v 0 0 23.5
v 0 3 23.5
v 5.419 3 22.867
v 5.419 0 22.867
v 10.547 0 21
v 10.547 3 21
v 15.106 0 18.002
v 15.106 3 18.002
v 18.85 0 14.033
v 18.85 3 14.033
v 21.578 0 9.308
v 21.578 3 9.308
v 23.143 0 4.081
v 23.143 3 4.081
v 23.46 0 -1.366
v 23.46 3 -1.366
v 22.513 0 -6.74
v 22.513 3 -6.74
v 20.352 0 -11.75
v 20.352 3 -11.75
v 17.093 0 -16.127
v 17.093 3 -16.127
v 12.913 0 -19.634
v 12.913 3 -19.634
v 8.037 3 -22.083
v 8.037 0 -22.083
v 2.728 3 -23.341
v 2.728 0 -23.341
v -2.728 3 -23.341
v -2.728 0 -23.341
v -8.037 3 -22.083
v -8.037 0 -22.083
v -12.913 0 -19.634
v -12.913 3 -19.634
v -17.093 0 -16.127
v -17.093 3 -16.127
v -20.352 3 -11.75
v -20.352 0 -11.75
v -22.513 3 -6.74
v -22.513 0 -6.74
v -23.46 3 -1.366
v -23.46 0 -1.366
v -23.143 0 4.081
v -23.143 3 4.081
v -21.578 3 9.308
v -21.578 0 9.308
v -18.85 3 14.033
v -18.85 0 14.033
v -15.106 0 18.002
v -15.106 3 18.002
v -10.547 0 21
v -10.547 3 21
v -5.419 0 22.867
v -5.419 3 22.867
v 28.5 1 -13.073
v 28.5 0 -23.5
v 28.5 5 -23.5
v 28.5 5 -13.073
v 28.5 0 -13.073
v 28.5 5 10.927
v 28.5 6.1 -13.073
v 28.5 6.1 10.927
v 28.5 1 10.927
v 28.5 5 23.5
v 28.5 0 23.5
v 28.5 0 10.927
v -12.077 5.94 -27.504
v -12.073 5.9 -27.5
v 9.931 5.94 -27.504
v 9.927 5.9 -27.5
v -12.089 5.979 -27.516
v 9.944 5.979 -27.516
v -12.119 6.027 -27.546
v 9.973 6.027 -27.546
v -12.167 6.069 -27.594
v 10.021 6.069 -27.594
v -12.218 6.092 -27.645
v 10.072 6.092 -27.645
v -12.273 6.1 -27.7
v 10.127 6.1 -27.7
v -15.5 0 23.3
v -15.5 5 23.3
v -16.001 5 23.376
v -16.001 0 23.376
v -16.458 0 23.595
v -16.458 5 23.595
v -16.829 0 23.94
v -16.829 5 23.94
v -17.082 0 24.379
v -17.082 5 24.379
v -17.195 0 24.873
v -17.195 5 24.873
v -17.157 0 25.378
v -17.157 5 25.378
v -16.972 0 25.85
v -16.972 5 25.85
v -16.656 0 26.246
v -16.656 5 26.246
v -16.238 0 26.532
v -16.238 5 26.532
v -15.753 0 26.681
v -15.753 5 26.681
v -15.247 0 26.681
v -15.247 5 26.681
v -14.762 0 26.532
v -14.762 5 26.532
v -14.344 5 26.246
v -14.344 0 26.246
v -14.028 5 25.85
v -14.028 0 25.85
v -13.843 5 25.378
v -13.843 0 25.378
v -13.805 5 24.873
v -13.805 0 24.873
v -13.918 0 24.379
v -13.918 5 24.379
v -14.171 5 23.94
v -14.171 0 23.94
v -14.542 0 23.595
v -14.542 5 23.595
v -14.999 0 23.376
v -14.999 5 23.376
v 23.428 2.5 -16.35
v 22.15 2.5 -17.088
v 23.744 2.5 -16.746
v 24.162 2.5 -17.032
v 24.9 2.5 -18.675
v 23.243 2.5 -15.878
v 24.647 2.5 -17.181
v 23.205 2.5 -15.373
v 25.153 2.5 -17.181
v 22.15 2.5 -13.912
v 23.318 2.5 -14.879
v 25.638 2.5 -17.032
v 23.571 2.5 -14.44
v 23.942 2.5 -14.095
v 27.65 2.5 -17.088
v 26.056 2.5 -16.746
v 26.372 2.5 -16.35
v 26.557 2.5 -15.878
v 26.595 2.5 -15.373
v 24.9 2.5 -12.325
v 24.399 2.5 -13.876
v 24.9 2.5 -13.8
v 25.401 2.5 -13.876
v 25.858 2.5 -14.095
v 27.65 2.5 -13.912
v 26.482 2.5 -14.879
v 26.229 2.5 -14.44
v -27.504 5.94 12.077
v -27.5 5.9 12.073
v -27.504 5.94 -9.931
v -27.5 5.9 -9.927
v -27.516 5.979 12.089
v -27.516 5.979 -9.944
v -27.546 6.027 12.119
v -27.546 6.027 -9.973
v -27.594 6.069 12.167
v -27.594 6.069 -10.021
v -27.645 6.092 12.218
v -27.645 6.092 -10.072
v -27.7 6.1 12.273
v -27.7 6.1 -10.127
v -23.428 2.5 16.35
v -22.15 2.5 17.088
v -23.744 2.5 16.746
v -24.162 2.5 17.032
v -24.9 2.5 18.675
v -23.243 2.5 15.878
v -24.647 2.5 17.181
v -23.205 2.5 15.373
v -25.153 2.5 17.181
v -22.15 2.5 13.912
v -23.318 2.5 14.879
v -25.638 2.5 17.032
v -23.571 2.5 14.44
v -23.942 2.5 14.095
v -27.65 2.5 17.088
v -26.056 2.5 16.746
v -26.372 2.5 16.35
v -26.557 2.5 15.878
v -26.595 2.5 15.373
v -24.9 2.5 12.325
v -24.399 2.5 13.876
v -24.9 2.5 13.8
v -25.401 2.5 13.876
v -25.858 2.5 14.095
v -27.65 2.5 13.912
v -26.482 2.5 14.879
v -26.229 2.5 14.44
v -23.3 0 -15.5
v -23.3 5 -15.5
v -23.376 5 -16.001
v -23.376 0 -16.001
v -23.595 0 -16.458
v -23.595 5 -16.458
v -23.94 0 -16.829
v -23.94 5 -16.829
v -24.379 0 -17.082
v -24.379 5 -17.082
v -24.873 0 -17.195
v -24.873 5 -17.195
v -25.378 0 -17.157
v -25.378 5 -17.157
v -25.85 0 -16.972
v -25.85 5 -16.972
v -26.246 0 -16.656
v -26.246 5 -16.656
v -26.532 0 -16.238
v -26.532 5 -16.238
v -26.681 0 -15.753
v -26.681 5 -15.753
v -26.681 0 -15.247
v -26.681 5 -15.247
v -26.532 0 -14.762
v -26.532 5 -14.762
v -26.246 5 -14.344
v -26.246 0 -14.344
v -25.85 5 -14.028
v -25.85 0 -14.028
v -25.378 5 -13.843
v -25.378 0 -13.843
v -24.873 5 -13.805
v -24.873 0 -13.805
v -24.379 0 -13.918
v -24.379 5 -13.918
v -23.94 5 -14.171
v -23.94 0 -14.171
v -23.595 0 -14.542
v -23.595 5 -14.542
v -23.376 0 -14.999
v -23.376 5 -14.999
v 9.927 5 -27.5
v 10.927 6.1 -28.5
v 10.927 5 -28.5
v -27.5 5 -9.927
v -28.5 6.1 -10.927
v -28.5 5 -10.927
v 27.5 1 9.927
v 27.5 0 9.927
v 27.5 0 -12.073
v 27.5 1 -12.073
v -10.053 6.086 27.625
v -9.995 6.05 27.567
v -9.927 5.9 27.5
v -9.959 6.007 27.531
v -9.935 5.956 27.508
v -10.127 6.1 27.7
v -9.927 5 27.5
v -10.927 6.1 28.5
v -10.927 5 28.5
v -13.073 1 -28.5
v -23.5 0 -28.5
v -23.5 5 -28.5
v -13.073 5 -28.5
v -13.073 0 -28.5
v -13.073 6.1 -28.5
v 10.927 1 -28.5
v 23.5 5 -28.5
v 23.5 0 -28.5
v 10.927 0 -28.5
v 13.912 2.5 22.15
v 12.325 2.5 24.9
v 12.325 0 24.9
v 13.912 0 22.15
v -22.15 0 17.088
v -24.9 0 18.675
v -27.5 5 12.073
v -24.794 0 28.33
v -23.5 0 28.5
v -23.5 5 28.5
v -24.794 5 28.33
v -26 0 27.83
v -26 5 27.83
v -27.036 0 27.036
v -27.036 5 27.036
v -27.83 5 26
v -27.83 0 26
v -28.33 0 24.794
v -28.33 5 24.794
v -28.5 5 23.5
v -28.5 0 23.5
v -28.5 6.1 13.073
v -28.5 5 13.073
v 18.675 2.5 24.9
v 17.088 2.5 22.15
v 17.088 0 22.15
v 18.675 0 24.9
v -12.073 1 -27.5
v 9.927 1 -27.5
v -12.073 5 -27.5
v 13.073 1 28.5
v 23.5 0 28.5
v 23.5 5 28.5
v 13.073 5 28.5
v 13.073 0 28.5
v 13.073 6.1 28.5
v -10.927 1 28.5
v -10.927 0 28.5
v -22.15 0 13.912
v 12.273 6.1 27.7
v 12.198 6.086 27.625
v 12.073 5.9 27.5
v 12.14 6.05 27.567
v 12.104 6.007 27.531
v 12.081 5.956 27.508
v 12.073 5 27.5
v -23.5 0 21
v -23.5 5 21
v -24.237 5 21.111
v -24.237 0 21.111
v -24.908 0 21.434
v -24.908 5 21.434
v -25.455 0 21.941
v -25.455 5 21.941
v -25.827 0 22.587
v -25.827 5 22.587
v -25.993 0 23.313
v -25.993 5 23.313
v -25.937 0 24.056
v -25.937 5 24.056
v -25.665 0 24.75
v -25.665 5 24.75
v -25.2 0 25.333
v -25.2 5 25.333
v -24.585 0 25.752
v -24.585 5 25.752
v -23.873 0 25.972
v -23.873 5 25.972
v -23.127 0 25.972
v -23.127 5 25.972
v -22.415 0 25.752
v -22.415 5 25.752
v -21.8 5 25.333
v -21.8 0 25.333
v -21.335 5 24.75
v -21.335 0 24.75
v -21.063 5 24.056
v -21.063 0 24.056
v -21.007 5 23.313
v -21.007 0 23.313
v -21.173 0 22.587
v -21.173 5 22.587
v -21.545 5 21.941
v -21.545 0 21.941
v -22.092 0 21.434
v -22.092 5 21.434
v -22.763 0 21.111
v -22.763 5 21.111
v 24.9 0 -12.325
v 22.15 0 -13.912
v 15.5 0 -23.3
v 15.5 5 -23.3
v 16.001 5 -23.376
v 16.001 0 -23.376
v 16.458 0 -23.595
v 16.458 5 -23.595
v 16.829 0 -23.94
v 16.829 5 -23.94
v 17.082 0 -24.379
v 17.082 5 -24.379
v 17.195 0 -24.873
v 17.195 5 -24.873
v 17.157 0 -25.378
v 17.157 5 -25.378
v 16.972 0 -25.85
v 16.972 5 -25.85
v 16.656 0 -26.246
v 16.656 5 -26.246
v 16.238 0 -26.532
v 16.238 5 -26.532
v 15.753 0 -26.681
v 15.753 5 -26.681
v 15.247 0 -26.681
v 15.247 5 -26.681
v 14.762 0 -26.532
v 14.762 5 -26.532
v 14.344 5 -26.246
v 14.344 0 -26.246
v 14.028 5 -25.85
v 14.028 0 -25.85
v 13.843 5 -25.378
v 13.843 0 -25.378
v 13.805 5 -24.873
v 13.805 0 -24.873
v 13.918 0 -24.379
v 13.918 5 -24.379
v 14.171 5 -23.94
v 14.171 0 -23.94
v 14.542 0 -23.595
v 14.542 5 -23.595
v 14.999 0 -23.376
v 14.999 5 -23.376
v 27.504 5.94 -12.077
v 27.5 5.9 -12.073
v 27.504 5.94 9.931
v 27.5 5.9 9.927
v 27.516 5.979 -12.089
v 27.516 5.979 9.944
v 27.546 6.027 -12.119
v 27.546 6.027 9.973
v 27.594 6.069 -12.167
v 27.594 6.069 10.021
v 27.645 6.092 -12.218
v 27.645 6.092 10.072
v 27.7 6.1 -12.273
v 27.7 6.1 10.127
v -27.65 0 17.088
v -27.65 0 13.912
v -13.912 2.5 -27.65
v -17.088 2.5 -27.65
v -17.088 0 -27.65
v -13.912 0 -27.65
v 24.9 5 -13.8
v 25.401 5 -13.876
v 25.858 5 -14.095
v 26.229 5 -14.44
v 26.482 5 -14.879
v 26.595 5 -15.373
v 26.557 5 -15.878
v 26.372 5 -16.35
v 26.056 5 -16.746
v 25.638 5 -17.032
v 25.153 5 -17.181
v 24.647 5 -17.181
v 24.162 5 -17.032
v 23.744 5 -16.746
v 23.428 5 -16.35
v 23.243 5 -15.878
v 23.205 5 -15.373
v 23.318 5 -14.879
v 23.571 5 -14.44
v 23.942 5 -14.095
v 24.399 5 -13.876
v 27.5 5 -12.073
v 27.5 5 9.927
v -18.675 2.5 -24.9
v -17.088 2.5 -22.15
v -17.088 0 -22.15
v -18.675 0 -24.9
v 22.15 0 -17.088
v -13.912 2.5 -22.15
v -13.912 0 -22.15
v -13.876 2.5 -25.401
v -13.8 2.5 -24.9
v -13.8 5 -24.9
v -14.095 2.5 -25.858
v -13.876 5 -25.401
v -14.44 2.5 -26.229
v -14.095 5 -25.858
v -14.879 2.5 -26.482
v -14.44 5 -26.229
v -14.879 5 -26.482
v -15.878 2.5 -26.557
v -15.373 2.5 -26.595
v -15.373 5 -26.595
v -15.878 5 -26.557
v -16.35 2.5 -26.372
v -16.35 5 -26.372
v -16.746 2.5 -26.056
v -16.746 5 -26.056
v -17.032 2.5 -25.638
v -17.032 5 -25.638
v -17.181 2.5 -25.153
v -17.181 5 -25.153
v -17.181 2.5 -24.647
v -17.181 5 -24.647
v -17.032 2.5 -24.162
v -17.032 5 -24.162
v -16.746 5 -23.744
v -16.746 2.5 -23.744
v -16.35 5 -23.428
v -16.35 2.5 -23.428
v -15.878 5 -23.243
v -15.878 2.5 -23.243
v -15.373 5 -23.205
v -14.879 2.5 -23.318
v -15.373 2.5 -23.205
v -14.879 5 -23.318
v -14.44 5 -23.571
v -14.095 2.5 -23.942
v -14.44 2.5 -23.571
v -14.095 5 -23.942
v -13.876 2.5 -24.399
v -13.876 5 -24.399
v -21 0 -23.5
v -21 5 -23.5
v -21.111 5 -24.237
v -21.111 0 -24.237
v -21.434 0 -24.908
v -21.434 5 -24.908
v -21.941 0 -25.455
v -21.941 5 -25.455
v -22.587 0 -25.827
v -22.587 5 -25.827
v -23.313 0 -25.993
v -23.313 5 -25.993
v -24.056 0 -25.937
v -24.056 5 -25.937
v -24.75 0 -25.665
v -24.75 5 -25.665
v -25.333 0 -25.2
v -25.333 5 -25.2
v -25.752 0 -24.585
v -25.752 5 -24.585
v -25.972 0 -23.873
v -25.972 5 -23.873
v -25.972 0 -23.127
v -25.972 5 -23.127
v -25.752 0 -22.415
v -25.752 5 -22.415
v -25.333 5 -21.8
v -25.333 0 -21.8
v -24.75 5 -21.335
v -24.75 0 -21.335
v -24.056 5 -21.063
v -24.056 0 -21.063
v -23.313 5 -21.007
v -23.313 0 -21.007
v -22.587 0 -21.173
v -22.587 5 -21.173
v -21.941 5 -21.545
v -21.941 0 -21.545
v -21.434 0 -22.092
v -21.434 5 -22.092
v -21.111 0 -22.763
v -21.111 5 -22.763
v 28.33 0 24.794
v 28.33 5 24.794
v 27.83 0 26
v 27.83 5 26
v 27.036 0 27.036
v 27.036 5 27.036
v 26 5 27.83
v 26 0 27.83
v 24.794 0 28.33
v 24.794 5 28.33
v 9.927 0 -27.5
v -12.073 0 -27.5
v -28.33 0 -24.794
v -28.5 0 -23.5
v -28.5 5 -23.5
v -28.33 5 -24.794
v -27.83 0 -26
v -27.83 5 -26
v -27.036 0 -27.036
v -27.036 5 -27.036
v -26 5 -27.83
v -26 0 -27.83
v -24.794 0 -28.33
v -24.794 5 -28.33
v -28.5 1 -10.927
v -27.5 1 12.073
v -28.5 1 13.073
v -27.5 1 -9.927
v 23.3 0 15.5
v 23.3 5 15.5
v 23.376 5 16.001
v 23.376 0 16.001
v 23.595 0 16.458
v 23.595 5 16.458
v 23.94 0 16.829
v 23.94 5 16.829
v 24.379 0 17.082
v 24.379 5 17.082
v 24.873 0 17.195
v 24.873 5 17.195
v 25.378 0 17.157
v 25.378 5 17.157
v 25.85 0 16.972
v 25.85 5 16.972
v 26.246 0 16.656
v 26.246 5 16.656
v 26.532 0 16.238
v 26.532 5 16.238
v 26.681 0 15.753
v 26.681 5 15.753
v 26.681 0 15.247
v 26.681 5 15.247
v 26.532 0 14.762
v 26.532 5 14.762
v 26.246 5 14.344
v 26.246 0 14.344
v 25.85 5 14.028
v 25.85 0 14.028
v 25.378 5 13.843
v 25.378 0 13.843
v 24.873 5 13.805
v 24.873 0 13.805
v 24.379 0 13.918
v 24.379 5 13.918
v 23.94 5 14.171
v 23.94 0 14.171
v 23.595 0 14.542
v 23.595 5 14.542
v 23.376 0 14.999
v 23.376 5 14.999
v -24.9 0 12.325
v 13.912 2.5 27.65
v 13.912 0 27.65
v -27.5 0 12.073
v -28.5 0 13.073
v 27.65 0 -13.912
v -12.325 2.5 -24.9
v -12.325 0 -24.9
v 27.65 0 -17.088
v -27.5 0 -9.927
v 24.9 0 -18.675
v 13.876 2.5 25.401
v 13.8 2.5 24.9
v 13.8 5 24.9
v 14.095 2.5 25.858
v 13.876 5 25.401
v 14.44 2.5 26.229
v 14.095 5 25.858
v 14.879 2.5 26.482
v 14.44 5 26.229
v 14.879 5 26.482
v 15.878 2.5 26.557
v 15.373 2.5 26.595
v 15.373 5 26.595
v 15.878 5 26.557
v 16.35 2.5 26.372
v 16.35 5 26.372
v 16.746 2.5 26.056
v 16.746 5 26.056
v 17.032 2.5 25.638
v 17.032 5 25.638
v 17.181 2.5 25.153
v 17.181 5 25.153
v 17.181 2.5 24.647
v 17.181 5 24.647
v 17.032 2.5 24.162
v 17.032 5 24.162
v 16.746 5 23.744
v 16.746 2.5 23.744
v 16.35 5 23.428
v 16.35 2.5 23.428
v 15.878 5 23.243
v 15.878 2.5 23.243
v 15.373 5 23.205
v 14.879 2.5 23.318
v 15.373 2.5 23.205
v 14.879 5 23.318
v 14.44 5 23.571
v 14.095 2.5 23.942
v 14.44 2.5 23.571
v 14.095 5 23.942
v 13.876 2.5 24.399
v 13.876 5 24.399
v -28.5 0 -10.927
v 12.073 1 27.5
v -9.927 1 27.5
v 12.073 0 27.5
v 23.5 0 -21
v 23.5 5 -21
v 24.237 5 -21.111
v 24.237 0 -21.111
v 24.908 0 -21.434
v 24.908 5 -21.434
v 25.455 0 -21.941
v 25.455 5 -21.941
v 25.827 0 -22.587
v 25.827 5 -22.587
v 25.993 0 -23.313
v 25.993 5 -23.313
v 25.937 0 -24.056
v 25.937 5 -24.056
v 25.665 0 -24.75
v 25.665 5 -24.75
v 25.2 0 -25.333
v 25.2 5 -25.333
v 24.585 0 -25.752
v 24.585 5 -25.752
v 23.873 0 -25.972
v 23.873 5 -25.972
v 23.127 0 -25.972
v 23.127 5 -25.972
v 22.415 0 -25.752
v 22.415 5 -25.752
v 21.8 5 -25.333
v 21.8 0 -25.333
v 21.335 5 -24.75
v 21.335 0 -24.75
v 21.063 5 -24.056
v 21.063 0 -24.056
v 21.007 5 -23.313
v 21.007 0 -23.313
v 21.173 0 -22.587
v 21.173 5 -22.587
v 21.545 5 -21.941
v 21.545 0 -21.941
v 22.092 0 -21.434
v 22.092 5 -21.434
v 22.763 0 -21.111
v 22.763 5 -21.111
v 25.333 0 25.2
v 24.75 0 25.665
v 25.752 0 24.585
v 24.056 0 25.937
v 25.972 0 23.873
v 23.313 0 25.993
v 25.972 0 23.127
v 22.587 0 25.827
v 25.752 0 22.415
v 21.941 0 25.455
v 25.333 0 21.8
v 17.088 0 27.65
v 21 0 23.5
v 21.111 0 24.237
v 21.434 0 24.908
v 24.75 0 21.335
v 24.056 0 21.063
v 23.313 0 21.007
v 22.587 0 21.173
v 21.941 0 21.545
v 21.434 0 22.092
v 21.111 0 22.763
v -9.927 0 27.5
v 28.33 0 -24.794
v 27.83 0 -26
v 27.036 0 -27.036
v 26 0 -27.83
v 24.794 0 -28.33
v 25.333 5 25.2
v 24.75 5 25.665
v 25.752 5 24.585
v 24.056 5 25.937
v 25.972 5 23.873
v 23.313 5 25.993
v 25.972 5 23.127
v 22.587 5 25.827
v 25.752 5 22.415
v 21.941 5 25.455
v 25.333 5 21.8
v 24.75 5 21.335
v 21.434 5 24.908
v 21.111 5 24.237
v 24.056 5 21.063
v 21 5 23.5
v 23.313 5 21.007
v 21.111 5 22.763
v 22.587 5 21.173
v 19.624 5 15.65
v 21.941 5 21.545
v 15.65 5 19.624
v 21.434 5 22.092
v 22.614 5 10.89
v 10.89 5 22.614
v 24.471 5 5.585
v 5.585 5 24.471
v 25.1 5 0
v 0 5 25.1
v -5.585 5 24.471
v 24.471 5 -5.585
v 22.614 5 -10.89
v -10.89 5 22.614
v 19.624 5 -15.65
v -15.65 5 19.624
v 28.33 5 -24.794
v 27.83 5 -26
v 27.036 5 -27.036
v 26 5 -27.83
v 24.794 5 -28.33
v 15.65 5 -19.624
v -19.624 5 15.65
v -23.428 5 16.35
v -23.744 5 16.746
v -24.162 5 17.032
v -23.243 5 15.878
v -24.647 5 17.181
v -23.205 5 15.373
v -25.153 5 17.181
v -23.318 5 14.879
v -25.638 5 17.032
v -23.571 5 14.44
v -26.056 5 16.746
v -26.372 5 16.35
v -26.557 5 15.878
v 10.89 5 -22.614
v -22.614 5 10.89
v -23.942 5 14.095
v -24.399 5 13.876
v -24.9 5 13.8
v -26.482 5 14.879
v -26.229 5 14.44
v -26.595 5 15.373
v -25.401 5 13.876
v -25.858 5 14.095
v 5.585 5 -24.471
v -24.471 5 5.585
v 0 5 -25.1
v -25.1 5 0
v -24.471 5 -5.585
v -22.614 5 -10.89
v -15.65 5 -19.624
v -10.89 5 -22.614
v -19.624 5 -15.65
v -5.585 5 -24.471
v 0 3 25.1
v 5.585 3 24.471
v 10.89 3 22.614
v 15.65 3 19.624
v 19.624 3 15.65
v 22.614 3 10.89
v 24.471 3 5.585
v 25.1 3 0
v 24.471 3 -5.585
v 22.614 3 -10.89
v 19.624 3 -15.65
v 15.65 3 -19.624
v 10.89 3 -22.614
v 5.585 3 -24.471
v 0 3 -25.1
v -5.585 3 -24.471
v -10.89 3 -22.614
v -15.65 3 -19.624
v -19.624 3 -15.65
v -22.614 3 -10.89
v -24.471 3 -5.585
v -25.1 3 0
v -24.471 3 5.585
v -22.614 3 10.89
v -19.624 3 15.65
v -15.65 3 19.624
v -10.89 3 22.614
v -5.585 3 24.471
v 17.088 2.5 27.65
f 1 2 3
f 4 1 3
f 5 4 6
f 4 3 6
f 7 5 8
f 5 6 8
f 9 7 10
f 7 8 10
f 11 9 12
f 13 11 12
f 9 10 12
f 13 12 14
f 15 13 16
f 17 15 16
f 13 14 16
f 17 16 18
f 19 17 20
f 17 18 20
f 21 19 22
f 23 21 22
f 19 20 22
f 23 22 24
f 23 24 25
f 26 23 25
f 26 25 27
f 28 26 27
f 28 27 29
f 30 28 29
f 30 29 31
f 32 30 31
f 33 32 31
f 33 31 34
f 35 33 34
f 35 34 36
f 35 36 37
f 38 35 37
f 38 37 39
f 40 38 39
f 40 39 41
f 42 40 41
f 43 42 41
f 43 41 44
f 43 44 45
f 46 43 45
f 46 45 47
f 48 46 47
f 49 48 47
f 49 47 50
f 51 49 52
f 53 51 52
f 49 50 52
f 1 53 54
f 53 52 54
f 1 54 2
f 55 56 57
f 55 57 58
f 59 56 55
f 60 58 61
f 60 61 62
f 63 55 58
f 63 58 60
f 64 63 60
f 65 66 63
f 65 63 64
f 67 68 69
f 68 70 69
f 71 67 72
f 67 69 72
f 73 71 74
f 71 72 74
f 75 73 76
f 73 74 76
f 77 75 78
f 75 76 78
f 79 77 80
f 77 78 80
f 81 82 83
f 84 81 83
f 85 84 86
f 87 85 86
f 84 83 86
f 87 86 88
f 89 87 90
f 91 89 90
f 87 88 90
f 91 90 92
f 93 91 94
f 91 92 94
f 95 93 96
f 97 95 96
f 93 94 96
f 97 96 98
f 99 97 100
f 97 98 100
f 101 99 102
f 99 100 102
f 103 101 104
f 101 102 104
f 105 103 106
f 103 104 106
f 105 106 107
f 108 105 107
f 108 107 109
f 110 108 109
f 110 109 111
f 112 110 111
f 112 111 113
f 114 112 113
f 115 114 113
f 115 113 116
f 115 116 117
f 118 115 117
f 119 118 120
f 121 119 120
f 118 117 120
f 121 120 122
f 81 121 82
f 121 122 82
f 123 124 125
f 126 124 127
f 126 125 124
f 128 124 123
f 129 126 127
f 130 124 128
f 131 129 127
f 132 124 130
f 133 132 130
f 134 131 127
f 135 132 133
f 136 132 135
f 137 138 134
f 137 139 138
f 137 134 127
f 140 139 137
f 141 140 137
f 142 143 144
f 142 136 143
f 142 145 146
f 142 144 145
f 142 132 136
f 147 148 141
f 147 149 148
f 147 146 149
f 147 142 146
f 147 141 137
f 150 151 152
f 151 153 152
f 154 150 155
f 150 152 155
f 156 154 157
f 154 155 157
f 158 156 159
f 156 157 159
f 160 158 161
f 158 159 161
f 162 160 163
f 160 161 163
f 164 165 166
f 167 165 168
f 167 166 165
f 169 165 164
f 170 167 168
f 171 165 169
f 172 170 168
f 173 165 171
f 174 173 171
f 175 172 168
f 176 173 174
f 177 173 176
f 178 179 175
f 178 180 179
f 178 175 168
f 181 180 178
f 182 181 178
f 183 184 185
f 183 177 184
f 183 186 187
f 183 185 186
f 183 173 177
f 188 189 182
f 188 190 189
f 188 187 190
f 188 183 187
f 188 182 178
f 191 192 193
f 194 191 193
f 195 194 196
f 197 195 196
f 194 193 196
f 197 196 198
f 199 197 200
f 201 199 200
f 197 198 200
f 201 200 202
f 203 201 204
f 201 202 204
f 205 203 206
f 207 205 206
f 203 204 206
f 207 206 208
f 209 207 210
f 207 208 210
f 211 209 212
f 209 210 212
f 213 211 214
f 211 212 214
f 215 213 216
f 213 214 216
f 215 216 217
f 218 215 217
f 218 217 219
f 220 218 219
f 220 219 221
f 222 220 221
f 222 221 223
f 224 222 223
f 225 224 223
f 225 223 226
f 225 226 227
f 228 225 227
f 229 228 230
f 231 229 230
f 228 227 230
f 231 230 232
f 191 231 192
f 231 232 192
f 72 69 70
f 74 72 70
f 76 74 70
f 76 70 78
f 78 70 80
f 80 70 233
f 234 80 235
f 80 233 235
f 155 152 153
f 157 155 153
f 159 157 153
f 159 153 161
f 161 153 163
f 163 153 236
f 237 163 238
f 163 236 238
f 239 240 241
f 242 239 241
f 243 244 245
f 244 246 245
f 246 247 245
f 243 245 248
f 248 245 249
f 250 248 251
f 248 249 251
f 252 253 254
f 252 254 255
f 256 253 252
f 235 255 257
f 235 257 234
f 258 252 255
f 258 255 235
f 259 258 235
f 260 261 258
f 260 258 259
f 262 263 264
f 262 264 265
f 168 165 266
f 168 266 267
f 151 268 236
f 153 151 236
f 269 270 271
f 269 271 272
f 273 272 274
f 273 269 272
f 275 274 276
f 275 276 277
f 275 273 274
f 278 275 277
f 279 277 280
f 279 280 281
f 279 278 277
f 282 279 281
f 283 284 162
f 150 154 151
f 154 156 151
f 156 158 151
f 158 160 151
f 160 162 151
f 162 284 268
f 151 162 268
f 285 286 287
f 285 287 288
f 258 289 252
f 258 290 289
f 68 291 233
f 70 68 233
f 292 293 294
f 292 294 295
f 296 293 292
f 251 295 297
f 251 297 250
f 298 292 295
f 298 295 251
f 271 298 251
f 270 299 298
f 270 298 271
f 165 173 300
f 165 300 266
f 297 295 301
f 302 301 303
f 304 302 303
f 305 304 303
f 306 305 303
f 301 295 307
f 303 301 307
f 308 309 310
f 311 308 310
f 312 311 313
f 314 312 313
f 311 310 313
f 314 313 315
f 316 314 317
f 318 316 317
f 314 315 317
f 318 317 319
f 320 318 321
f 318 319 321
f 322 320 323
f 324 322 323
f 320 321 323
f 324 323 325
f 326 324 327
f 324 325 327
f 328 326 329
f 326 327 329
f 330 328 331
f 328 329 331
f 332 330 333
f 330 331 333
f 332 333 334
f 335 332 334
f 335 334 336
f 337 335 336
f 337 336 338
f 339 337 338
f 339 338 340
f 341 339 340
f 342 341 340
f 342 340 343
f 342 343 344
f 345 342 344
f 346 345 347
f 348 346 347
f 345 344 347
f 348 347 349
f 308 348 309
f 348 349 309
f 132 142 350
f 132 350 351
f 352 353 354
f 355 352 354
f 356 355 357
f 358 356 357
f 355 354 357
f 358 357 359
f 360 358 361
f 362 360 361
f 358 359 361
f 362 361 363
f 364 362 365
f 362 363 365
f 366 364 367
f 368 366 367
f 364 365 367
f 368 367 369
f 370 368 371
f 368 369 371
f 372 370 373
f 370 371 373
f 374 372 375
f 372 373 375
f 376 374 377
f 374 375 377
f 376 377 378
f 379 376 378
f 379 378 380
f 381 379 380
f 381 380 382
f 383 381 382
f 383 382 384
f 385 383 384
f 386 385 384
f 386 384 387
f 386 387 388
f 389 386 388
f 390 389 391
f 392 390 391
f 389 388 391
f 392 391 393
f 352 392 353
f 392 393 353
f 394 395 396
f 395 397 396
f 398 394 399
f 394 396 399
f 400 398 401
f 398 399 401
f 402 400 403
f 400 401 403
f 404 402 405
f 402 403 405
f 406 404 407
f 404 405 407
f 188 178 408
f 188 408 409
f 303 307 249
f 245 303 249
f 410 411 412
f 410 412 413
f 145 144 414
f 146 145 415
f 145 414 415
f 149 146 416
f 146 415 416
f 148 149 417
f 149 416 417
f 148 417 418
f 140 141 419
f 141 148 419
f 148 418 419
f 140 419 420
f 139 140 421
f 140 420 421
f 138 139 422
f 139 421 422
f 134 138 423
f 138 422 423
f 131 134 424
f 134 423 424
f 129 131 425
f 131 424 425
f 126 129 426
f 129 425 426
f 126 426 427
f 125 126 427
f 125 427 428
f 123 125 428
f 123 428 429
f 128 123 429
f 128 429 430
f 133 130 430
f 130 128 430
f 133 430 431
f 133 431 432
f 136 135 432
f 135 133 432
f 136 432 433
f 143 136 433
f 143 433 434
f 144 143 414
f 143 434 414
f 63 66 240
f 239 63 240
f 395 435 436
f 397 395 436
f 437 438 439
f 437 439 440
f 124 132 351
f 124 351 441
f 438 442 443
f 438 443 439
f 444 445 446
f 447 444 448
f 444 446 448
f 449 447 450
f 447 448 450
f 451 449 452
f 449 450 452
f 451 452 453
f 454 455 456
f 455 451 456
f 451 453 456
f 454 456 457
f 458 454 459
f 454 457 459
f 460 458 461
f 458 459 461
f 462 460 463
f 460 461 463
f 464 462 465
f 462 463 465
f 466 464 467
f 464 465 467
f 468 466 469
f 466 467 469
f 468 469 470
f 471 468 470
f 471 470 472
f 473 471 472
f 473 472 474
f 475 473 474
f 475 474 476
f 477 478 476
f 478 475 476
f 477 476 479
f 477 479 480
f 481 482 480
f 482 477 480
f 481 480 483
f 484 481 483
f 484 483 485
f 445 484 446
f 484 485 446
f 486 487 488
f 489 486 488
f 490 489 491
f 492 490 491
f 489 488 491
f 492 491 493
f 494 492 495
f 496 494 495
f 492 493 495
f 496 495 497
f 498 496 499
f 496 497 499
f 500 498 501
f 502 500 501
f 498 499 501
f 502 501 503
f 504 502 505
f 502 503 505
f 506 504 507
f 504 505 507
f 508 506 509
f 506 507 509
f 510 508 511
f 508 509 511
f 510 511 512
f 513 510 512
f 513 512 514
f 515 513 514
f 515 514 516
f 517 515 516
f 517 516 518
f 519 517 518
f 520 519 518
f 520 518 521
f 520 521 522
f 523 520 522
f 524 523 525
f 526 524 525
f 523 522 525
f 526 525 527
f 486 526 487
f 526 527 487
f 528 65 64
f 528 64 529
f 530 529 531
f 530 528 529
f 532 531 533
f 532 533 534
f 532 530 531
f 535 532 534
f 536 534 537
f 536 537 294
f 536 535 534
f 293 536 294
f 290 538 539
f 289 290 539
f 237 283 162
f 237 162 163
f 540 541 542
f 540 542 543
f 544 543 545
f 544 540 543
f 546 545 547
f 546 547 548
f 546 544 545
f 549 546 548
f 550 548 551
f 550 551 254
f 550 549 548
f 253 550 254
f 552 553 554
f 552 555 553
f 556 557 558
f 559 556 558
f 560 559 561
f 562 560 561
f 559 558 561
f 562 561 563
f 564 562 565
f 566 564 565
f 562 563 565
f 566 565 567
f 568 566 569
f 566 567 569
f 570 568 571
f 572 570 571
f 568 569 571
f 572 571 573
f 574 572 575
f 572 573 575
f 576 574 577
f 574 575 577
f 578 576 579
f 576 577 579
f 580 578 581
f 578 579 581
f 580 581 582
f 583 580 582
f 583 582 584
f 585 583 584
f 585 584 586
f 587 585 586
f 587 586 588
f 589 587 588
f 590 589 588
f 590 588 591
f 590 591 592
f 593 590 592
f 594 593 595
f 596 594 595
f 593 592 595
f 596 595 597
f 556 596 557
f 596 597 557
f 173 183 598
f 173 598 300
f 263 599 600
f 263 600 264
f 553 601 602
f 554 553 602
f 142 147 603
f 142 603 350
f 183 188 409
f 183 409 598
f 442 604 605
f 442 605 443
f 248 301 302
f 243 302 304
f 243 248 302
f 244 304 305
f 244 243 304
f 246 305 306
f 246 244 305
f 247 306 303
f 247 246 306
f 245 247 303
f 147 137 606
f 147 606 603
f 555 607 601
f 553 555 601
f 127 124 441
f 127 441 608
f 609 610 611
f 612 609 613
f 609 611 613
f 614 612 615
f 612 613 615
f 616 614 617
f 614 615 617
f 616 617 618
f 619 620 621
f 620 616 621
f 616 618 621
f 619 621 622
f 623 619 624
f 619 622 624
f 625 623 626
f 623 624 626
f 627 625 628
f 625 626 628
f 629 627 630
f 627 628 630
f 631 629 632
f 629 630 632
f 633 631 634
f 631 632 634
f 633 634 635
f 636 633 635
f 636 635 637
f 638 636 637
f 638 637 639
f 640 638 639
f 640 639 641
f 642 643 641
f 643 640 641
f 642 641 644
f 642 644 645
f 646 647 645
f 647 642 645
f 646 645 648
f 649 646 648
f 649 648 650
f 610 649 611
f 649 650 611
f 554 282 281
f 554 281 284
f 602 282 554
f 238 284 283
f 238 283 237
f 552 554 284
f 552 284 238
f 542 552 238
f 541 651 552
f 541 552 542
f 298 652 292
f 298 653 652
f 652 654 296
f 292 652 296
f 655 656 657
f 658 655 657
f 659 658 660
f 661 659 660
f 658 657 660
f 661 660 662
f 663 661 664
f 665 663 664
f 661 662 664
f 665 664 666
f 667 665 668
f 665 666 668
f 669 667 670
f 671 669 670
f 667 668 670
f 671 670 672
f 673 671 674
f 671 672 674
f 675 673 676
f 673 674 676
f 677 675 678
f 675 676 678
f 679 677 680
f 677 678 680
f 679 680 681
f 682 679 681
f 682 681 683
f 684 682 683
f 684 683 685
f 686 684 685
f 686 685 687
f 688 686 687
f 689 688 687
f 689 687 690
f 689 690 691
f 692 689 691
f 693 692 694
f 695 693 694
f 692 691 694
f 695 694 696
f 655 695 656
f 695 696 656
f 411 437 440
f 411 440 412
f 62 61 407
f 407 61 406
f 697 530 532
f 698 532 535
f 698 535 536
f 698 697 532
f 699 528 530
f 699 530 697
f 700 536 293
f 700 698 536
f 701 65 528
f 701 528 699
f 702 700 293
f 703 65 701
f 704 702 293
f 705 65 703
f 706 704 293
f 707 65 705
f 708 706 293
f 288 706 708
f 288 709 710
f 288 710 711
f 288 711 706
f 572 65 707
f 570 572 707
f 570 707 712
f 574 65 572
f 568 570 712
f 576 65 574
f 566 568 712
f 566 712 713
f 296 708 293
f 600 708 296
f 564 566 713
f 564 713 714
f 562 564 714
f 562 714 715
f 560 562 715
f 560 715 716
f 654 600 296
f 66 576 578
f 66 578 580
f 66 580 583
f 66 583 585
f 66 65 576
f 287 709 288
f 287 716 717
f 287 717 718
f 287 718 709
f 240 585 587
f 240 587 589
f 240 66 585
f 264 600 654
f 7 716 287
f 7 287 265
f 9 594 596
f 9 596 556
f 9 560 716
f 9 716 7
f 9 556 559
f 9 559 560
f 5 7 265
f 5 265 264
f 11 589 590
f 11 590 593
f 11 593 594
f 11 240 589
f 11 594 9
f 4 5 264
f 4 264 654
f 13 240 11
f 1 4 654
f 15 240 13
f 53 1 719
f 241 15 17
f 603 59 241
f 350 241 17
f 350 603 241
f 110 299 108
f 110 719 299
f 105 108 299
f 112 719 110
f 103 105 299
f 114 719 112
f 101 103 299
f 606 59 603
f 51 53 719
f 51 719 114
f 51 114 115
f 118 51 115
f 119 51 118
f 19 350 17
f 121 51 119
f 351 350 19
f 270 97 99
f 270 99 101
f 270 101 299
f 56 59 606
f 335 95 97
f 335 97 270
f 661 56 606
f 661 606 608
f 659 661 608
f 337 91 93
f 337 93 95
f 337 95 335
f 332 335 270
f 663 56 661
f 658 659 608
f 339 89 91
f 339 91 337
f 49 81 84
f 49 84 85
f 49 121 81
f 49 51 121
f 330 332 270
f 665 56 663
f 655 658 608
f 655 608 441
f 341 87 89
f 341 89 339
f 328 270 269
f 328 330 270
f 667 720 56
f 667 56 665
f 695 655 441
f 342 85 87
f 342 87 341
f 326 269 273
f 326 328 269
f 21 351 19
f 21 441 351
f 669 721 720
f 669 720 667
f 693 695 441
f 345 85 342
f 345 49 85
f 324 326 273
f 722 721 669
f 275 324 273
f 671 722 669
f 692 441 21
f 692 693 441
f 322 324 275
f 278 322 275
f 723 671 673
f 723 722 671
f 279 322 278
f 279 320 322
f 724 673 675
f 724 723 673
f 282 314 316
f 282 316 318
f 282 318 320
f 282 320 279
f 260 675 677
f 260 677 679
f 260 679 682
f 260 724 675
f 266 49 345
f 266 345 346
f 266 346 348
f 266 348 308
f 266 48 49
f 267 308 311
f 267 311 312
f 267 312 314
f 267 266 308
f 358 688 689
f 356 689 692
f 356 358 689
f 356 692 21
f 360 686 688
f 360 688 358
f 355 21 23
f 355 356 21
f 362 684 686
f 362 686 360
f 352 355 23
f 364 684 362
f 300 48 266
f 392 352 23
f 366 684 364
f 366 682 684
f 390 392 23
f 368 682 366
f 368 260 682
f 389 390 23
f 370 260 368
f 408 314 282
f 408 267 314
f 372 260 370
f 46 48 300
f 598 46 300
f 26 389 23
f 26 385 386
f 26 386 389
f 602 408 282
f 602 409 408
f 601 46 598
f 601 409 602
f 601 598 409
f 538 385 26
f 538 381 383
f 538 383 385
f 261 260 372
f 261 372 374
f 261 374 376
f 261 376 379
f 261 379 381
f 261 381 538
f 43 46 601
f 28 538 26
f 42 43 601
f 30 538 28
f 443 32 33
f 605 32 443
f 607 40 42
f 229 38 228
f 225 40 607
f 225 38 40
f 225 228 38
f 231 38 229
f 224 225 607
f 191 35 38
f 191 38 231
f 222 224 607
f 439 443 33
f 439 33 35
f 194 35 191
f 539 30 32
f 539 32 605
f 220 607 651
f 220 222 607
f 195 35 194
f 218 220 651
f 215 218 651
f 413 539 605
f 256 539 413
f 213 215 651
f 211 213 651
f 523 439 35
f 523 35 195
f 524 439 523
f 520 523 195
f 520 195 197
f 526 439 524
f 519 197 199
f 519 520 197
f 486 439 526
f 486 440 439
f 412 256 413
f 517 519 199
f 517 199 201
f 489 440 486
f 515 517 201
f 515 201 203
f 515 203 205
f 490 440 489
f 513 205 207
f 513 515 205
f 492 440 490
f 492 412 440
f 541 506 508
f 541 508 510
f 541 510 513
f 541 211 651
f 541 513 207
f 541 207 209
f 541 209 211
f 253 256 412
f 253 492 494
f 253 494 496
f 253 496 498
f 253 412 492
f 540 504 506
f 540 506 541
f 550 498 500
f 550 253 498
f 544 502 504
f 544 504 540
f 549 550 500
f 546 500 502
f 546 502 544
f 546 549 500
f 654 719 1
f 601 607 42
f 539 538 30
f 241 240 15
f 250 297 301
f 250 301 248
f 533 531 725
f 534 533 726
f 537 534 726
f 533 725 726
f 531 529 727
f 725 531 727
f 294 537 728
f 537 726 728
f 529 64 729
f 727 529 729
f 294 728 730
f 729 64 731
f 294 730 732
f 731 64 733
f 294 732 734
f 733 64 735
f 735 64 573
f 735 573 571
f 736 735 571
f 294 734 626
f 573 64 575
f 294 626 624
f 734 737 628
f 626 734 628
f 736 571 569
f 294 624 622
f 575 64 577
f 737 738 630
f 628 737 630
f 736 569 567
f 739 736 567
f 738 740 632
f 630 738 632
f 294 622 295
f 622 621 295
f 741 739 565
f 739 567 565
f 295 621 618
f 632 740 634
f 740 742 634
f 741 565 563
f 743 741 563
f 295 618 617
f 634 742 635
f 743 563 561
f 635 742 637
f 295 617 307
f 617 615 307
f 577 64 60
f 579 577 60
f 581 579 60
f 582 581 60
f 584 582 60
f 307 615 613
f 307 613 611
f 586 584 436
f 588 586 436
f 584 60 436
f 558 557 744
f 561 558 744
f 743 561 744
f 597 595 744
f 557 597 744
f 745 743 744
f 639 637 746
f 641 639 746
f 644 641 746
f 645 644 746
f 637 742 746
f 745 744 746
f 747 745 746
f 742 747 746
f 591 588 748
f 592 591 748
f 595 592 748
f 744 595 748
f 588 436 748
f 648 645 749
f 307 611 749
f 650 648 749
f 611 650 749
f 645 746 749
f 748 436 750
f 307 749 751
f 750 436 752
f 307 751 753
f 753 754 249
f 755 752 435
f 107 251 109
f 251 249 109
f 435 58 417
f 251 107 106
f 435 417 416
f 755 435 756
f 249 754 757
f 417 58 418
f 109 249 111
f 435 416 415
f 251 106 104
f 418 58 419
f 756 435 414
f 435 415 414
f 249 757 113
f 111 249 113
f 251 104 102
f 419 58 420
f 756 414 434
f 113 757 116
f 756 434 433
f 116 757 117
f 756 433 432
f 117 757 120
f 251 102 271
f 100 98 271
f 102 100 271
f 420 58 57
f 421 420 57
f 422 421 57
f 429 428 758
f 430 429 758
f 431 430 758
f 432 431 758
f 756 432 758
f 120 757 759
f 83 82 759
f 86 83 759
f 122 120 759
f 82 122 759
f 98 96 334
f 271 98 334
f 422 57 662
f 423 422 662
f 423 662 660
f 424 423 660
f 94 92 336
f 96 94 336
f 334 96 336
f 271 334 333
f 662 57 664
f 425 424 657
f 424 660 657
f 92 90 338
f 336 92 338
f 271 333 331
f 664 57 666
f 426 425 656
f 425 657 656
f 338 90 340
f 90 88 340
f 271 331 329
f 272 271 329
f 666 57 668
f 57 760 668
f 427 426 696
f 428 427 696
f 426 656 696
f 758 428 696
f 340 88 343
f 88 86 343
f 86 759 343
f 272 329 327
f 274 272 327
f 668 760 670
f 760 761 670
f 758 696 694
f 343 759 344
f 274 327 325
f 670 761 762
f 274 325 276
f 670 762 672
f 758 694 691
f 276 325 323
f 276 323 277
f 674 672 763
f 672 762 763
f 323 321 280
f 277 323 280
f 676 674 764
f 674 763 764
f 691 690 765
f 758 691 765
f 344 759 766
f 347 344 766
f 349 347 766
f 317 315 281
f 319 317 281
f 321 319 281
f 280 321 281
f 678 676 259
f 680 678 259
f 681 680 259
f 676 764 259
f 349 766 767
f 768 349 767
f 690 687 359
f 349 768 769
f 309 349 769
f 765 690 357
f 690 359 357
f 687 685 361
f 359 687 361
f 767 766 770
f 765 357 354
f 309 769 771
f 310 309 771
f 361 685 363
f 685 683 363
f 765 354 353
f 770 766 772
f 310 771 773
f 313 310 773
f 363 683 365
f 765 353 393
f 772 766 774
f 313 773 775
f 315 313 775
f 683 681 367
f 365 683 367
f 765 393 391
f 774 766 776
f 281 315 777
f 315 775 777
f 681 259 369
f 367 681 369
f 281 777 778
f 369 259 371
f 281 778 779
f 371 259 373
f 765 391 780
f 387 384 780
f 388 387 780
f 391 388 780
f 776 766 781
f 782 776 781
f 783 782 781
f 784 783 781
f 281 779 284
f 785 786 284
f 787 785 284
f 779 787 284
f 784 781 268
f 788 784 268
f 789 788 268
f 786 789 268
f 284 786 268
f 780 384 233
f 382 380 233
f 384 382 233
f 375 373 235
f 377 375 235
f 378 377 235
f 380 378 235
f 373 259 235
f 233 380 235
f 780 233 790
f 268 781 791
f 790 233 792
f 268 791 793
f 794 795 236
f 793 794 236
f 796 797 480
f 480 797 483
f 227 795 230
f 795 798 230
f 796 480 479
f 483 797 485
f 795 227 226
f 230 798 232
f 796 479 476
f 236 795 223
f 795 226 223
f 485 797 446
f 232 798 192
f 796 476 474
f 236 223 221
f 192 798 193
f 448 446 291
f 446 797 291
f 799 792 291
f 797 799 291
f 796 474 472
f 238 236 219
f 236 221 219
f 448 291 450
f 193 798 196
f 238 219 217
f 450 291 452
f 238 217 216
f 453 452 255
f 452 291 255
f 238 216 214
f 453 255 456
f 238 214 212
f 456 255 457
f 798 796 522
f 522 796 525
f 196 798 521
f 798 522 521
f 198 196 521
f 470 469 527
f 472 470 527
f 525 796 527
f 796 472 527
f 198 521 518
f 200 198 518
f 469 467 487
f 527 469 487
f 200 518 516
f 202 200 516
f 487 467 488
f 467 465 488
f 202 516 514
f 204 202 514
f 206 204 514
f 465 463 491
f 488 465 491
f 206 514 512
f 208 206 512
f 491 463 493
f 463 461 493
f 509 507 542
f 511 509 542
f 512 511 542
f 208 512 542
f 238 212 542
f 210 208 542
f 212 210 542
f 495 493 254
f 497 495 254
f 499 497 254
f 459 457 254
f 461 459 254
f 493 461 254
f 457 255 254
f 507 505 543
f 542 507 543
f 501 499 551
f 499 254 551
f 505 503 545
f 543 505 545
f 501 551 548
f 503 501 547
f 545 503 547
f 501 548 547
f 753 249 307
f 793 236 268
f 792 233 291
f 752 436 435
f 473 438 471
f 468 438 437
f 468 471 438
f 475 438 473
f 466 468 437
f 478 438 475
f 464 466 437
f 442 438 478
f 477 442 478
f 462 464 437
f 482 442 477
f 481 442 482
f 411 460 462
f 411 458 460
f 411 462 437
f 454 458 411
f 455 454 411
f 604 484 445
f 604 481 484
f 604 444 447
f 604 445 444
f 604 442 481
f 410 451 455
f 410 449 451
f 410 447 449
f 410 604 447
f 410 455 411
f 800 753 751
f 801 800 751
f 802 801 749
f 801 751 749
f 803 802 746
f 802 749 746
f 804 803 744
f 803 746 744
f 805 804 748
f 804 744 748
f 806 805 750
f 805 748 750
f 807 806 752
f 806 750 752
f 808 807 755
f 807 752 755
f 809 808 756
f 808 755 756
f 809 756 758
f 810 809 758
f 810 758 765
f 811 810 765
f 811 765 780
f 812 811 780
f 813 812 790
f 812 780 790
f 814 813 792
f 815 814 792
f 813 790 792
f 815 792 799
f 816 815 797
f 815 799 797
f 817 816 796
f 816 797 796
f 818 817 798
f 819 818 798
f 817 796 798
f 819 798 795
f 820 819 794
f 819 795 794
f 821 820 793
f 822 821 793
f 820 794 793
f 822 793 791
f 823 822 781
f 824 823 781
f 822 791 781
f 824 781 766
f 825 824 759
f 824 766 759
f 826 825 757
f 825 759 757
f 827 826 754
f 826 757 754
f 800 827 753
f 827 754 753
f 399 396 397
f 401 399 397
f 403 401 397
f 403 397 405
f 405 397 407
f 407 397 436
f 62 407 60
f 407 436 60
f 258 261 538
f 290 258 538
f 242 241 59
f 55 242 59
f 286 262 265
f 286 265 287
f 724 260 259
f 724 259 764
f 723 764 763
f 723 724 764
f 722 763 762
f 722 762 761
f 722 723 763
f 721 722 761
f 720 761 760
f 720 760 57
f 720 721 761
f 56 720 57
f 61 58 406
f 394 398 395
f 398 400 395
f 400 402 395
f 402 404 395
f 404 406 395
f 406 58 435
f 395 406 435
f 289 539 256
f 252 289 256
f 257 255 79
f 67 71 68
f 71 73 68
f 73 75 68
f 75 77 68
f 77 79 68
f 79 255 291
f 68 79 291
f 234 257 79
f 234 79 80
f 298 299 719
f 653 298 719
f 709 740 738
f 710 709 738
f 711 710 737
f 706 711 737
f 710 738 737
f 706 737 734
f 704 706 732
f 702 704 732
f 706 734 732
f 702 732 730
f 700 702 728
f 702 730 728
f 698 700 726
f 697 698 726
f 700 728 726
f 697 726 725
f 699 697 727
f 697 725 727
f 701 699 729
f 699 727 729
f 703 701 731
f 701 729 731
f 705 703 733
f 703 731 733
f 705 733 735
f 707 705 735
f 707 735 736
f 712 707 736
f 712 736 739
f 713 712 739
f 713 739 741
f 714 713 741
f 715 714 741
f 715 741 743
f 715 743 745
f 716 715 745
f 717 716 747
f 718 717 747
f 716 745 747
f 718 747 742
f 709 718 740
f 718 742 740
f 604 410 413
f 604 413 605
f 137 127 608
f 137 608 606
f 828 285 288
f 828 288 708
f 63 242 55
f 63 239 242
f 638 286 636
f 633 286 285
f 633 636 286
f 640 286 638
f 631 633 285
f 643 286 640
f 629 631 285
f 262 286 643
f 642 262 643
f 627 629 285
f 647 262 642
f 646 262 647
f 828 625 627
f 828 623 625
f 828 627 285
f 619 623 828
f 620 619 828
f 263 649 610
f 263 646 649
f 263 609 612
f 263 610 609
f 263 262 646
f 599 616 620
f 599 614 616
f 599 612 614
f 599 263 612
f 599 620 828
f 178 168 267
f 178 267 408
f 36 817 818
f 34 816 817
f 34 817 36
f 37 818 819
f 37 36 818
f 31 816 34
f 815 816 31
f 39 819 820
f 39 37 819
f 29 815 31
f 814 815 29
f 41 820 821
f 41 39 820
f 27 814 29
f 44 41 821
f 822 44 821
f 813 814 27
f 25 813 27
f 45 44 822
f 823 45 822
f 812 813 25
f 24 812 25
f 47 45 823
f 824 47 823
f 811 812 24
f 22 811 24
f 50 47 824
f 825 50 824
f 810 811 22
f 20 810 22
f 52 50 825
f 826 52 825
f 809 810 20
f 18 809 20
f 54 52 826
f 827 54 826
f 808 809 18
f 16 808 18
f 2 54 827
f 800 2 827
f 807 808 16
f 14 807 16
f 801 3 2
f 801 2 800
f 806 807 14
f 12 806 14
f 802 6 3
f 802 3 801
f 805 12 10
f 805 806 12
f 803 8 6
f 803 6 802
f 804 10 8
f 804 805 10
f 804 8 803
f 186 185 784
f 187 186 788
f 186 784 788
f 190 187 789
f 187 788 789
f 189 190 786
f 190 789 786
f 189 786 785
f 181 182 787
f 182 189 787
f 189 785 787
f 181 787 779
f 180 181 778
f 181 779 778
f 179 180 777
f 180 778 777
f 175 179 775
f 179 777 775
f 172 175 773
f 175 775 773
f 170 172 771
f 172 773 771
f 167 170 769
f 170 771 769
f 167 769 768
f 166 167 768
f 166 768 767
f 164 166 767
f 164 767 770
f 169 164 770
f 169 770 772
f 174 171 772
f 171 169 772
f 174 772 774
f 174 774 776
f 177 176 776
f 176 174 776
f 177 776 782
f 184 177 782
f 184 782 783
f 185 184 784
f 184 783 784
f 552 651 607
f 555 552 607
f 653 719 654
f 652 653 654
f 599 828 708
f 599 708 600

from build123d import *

# Parameters (mm, degrees)
BOSS_EXTRUDE1_DEPTH = 5
SKETCH2_R           = 1.7
SKETCH2_R_2         = 2.5
CUT_EXTRUDE3_DEPTH  = 5
SKETCH5_R           = 23.5
CUT_EXTRUDE5_DEPTH  = 41.614036982
SKETCH5_3_R         = 25.1
SKETCH5_3_R_2       = 23.5
CUT_EXTRUDE6_DEPTH  = 2
CUT_EXTRUDE7_START  = -2.5
SKETCH6_R           = 1.7
CUT_EXTRUDE7_DEPTH  = 2.5
BOSS_EXTRUDE2_DEPTH = 1.1
CUT_EXTRUDE8_DEPTH  = 1
CIRPATTERN9_COUNT   = 4
FILLET1_R           = 0.2


with BuildPart() as part:
    # Sketch1 → Boss-Extrude1 (new body)
    with BuildSketch(Plane(origin=(0, 0, 0), x_dir=(1, 0, 0), z_dir=(0, 1, 0))):
        with BuildLine():
            Line((23.5, -28.5), (-23.5, -28.5))
            ThreePointArc((-23.5, -28.5), (-27.035533906, -27.035533906), (-28.5, -23.5))
            Line((-28.5, -23.5), (-28.5, 23.5))
            ThreePointArc((-28.5, 23.5), (-27.035533906, 27.035533906), (-23.5, 28.5))
            Line((-23.5, 28.5), (23.5, 28.5))
            ThreePointArc((23.5, 28.5), (27.035533906, 27.035533906), (28.5, 23.5))
            Line((28.5, 23.5), (28.5, -23.5))
            ThreePointArc((28.5, -23.5), (27.035533906, -27.035533906), (23.5, -28.5))
        make_face()
    extrude(amount=BOSS_EXTRUDE1_DEPTH)

    # Sketch2 → Cut-Extrude3 (cut)
    with BuildSketch(Plane(origin=(0, 5, 0), x_dir=(1, 0, 0), z_dir=(0, 1, 0))):
        with Locations(Location((24.9, 15.5, 0), (0, 0, 270))):
            Circle(SKETCH2_R)
        with Locations(Location((15.5, 25, 0), (0, 0, 270))):
            Circle(SKETCH2_R)
        with Locations(Location((23.5, 23.5, 0), (0, 0, 270))):
            Circle(SKETCH2_R_2)
    cut_extrude3 = extrude(amount=-CUT_EXTRUDE3_DEPTH, mode=Mode.SUBTRACT)

    # Sketch5 → Cut-Extrude5 (cut, through all)
    with BuildSketch(Plane(origin=(0, 5, 0), x_dir=(1, 0, 0), z_dir=(0, 1, 0))):
        with Locations(Location((0, 0, 0), (0, 0, 270))):
            Circle(SKETCH5_R)
    extrude(amount=-CUT_EXTRUDE5_DEPTH, mode=Mode.SUBTRACT)

    # Sketch5<3> → Cut-Extrude6 (cut)
    with BuildSketch(Plane(origin=(0, 5, 0), x_dir=(1, 0, 0), z_dir=(0, 1, 0))):
        with Locations(Location((0, 0, 0), (0, 0, 270))):
            Circle(SKETCH5_3_R)
        with Locations(Location((0, 0, 0), (0, 0, 270))):
            Circle(SKETCH5_3_R_2, mode=Mode.SUBTRACT)
    extrude(amount=-CUT_EXTRUDE6_DEPTH, mode=Mode.SUBTRACT)

    # Sketch6 → Cut-Extrude7 (cut)
    with BuildSketch(Plane.XZ.offset(CUT_EXTRUDE7_START)):
        Polygon((22.15, -13.91228676), (22.15, -17.08771324), (24.9, -18.675426481), (27.65, -17.08771324), (27.65, -13.91228676), (24.9, -12.324573519), align=None)
        with Locations(Location((24.9, -15.5, 0), (0, 0, 90))):
            Circle(SKETCH6_R, mode=Mode.SUBTRACT)
    cut_extrude7 = extrude(amount=CUT_EXTRUDE7_DEPTH, mode=Mode.SUBTRACT)

    # Sketch7 → Boss-Extrude2 (add)
    with BuildSketch(Plane(origin=(0, 5, 0), x_dir=(1, 0, 0), z_dir=(0, 1, 0))):
        Polygon((-1.072782926, 27.5), (-1.072782926, 28.5), (-13.072782926, 28.5), (-12.072782926, 27.5), align=None)
        Polygon((9.927217074, 27.5), (10.927217074, 28.5), (-1.072782926, 28.5), (-1.072782926, 27.5), align=None)
    boss_extrude2 = extrude(amount=BOSS_EXTRUDE2_DEPTH)

    # Sketch8 → Cut-Extrude8 (cut)
    with BuildSketch(Plane.XZ):
        Polygon((-12.072782926, -27.5), (-13.072782926, -28.5), (10.927217074, -28.5), (9.927217074, -27.5), align=None)
    cut_extrude8 = extrude(amount=-CUT_EXTRUDE8_DEPTH, mode=Mode.SUBTRACT)

    # CirPattern9: Cut-Extrude3, Cut-Extrude7, Boss-Extrude2, Cut-Extrude8 ×4 about axis
    cirpattern9_axis = Axis((0, 0, 0), (0, 1, 0))
    add([cut_extrude3.rotate(cirpattern9_axis, i * 360 / CIRPATTERN9_COUNT) for i in range(1, CIRPATTERN9_COUNT)], mode=Mode.SUBTRACT)
    add([cut_extrude7.rotate(cirpattern9_axis, i * 360 / CIRPATTERN9_COUNT) for i in range(1, CIRPATTERN9_COUNT)], mode=Mode.SUBTRACT)
    add([boss_extrude2.rotate(cirpattern9_axis, i * 360 / CIRPATTERN9_COUNT) for i in range(1, CIRPATTERN9_COUNT)])
    add([cut_extrude8.rotate(cirpattern9_axis, i * 360 / CIRPATTERN9_COUNT) for i in range(1, CIRPATTERN9_COUNT)], mode=Mode.SUBTRACT)

    # Fillet1
    fillet1_edges = [part.edges().sort_by_distance(p)[0] for p in [
        (-27.5, 6.1, 1.072782926),
        (1.072782926, 6.1, 27.5),
        (27.5, 6.1, -1.072782926),
        (-1.072782926, 6.1, -27.5),
    ]]
    fillet(fillet1_edges, radius=FILLET1_R)


solid = part.part
